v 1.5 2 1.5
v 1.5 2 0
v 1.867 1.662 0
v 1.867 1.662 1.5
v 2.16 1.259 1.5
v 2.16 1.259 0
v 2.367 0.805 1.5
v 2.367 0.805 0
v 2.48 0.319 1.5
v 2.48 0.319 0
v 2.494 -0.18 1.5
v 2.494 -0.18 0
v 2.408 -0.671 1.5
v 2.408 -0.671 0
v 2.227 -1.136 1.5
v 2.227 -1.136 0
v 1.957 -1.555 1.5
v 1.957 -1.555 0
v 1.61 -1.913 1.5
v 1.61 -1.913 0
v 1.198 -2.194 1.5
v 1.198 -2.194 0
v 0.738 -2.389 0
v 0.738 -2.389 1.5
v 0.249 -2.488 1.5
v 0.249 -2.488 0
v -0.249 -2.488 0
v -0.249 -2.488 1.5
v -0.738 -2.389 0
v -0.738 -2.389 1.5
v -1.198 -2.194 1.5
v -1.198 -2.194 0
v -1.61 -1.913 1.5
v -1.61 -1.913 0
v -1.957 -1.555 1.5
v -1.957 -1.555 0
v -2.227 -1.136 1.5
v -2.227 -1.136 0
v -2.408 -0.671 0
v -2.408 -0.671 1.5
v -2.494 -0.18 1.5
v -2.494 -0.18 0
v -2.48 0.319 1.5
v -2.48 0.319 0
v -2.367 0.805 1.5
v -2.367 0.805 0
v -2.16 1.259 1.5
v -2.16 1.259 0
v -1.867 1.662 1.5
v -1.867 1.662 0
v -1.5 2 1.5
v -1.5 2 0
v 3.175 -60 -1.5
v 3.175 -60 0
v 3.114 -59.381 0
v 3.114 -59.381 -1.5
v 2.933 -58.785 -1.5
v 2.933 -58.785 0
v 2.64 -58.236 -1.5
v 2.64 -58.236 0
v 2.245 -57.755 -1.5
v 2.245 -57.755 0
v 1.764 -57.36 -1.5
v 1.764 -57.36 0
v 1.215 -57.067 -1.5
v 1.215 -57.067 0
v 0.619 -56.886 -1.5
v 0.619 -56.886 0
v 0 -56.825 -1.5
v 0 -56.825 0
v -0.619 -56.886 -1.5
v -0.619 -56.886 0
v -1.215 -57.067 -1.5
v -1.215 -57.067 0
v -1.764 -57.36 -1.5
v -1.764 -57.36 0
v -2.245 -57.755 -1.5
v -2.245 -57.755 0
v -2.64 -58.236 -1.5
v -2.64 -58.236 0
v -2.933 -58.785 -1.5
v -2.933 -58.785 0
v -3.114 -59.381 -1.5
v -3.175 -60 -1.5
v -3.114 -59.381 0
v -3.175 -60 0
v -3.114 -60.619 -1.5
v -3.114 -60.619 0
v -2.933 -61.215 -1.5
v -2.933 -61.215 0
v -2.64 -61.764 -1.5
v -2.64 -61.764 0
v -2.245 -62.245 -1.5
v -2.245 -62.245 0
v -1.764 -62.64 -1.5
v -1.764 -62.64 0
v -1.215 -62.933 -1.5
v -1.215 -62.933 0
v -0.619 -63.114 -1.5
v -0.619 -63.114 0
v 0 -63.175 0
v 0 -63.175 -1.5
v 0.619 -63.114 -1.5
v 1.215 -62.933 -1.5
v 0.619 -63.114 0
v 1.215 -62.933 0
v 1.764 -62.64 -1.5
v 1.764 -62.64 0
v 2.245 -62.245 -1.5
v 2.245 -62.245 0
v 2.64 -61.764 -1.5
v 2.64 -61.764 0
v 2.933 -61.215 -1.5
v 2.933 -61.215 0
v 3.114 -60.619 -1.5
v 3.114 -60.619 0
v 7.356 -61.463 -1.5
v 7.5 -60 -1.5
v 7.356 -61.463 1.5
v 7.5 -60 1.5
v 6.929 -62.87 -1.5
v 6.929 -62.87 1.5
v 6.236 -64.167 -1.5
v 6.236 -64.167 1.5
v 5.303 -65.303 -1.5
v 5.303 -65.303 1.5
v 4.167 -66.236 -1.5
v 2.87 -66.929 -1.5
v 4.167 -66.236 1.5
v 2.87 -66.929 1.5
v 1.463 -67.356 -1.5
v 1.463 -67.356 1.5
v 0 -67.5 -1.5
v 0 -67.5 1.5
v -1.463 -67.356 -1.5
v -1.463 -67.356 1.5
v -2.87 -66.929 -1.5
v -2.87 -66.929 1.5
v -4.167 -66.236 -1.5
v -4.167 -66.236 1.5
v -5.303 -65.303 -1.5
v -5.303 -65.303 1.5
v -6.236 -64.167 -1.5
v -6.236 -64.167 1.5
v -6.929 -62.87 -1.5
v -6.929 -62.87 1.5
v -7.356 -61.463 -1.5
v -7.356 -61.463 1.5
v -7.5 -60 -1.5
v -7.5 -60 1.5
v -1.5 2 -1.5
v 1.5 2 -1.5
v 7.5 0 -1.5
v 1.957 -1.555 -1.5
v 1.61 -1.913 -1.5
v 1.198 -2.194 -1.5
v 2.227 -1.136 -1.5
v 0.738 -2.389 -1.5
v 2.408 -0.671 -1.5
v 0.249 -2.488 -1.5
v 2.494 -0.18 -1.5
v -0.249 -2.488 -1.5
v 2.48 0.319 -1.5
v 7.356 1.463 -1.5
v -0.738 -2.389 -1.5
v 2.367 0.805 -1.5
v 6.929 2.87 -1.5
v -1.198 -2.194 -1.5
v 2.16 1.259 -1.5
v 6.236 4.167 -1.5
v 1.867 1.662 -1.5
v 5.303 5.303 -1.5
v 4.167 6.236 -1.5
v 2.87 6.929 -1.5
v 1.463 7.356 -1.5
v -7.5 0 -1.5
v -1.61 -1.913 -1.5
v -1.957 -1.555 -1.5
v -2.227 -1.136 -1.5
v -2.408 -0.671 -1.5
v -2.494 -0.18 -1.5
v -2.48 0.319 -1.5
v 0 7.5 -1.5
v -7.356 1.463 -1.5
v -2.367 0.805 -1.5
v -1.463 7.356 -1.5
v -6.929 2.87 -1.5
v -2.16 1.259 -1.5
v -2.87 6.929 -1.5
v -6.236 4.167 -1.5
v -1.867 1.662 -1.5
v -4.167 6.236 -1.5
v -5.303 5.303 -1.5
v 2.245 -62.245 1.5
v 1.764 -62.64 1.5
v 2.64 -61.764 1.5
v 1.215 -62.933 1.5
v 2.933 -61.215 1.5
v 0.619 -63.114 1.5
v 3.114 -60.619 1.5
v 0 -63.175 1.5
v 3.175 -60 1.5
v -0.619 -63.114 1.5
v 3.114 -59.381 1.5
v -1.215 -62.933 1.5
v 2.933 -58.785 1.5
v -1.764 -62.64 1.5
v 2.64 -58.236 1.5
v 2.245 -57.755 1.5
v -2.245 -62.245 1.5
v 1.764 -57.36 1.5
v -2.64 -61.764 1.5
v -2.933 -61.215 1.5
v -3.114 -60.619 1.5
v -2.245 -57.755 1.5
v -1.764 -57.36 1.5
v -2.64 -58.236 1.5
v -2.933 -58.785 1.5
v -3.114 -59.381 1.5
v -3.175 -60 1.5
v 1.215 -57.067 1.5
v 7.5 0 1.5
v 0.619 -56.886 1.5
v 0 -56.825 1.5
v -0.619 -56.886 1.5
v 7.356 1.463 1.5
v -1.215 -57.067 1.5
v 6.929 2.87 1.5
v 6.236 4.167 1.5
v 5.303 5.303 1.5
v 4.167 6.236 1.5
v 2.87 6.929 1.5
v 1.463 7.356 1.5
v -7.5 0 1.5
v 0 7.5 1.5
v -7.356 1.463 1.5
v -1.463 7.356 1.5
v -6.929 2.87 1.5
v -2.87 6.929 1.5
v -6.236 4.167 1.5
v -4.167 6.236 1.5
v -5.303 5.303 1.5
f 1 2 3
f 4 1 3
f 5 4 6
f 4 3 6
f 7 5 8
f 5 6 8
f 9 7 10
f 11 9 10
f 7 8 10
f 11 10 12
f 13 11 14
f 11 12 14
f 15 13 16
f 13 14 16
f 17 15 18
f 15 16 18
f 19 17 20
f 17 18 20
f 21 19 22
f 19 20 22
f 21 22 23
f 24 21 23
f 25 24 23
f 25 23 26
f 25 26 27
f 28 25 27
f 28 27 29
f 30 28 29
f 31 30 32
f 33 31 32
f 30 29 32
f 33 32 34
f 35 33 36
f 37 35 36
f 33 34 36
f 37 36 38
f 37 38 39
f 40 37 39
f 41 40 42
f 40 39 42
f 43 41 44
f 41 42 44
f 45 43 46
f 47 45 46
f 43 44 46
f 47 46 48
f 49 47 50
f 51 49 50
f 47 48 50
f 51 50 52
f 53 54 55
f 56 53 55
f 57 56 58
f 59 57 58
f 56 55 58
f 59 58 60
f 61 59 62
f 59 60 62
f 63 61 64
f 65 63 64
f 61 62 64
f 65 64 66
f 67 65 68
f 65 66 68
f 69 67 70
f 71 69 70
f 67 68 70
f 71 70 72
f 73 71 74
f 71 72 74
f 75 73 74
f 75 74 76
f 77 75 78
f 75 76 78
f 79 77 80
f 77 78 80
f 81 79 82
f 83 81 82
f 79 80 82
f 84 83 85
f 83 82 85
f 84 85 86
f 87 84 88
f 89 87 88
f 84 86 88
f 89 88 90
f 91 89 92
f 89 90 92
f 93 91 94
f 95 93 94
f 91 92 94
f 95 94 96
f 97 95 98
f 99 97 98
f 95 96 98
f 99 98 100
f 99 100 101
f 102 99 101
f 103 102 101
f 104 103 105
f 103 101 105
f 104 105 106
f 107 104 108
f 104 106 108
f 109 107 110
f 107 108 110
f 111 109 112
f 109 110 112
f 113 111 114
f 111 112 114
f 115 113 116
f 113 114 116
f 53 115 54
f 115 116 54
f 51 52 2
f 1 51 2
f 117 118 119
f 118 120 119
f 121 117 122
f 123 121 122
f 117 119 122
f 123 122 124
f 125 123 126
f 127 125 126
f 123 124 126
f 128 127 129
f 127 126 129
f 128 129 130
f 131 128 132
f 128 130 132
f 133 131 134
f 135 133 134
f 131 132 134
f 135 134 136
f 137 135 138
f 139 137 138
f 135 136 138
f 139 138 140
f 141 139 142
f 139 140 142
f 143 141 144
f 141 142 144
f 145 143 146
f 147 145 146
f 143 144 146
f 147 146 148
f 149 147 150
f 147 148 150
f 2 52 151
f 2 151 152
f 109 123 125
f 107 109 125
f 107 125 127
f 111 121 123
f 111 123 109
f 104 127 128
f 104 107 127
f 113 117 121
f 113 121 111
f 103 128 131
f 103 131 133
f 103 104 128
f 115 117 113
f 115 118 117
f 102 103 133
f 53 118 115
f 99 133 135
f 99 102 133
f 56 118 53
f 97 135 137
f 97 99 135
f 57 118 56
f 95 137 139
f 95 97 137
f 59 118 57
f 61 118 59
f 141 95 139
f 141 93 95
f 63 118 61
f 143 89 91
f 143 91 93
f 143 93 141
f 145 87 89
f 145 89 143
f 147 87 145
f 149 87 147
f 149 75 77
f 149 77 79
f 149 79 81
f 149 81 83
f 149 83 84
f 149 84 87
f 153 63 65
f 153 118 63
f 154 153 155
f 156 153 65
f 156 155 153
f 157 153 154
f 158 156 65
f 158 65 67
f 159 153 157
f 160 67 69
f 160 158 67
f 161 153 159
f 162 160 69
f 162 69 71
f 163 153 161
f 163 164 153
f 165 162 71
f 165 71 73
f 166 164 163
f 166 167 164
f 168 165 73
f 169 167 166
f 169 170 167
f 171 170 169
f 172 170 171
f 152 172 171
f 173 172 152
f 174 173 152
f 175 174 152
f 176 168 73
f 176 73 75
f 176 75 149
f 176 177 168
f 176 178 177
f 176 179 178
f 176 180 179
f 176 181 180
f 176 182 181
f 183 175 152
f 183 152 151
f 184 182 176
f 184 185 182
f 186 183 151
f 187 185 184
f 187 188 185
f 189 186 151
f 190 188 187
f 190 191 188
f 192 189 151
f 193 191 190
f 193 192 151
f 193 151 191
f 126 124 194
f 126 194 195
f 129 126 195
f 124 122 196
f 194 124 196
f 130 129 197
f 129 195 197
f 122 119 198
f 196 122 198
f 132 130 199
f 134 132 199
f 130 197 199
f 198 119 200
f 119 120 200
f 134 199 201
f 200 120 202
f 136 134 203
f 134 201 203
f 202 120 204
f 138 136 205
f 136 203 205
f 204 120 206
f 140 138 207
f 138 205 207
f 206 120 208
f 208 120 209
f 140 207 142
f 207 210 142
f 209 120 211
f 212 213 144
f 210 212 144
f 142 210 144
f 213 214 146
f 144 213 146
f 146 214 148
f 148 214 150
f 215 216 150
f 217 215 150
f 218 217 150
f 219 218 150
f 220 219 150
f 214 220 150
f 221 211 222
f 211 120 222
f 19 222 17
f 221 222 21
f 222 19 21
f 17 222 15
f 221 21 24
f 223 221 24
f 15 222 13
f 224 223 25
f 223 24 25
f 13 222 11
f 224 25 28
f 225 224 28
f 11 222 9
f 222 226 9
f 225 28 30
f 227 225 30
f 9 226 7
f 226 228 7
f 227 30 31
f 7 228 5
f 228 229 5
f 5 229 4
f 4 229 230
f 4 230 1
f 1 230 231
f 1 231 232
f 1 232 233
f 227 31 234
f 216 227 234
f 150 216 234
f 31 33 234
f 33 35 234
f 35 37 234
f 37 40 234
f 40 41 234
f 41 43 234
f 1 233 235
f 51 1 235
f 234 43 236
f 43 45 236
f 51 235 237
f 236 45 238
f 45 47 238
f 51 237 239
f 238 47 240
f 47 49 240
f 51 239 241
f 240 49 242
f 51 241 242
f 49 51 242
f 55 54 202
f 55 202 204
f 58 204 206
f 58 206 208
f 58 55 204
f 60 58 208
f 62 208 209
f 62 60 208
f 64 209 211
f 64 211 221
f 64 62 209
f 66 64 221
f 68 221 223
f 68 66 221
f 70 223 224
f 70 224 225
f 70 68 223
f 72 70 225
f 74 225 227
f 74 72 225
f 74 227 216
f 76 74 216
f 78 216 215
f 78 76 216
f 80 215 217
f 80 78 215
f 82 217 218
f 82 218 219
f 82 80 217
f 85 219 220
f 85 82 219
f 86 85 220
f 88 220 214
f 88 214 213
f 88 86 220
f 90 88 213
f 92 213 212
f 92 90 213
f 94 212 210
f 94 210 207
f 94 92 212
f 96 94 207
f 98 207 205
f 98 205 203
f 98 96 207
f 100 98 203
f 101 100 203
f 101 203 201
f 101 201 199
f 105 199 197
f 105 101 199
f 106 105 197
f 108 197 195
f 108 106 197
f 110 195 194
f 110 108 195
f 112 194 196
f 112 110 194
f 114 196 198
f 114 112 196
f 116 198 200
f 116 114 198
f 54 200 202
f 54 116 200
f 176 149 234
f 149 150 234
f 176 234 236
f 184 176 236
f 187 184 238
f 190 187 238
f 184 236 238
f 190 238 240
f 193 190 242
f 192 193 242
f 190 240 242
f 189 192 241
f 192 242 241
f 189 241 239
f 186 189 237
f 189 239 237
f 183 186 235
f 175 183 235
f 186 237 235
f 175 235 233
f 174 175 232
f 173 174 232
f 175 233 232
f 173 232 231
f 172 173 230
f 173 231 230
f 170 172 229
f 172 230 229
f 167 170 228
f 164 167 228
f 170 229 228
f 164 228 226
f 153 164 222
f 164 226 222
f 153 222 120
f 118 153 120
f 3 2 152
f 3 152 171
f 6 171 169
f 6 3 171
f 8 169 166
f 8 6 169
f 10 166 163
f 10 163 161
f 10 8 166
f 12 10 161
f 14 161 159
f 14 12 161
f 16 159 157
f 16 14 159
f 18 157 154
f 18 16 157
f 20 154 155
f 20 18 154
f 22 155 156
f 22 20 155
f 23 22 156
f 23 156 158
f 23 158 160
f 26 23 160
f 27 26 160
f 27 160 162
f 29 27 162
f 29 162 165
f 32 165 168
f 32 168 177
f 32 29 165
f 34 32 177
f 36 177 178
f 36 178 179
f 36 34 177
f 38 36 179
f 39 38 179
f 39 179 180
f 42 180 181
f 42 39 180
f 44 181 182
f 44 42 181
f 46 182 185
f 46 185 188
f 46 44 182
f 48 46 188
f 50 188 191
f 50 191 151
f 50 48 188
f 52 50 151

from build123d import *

# Parameters (mm, degrees)
SALIENTE_EXTRUIR1_DEPTH      = 1.5
SALIENTE_EXTRUIR1_DEPTH_BACK = 1.5
CROQUIS1_R                   = 3.175


with BuildPart() as part:
    # Croquis1 → Saliente-Extruir1 (new, two sides: drawn at the far end of the back side and taken through both)
    with BuildSketch(Plane.XY.offset(-SALIENTE_EXTRUIR1_DEPTH_BACK)):
        with BuildLine():
            Line((7.5, 0), (7.5, -60))
            ThreePointArc((7.5, -60), (0, -67.5), (-7.5, -60))
            Line((-7.5, -60), (-7.5, 0))
            ThreePointArc((-7.5, 0), (0, 7.5), (7.5, 0))
        make_face()
        with Locations((0, -60)):
            Circle(CROQUIS1_R, mode=Mode.SUBTRACT)
        with BuildLine():
            Line((-1.5, 2), (1.5, 2))
            ThreePointArc((1.5, 2), (0, -2.5), (-1.5, 2))
        make_face(mode=Mode.SUBTRACT)
    extrude(amount=SALIENTE_EXTRUIR1_DEPTH + SALIENTE_EXTRUIR1_DEPTH_BACK)


solid = part.part
